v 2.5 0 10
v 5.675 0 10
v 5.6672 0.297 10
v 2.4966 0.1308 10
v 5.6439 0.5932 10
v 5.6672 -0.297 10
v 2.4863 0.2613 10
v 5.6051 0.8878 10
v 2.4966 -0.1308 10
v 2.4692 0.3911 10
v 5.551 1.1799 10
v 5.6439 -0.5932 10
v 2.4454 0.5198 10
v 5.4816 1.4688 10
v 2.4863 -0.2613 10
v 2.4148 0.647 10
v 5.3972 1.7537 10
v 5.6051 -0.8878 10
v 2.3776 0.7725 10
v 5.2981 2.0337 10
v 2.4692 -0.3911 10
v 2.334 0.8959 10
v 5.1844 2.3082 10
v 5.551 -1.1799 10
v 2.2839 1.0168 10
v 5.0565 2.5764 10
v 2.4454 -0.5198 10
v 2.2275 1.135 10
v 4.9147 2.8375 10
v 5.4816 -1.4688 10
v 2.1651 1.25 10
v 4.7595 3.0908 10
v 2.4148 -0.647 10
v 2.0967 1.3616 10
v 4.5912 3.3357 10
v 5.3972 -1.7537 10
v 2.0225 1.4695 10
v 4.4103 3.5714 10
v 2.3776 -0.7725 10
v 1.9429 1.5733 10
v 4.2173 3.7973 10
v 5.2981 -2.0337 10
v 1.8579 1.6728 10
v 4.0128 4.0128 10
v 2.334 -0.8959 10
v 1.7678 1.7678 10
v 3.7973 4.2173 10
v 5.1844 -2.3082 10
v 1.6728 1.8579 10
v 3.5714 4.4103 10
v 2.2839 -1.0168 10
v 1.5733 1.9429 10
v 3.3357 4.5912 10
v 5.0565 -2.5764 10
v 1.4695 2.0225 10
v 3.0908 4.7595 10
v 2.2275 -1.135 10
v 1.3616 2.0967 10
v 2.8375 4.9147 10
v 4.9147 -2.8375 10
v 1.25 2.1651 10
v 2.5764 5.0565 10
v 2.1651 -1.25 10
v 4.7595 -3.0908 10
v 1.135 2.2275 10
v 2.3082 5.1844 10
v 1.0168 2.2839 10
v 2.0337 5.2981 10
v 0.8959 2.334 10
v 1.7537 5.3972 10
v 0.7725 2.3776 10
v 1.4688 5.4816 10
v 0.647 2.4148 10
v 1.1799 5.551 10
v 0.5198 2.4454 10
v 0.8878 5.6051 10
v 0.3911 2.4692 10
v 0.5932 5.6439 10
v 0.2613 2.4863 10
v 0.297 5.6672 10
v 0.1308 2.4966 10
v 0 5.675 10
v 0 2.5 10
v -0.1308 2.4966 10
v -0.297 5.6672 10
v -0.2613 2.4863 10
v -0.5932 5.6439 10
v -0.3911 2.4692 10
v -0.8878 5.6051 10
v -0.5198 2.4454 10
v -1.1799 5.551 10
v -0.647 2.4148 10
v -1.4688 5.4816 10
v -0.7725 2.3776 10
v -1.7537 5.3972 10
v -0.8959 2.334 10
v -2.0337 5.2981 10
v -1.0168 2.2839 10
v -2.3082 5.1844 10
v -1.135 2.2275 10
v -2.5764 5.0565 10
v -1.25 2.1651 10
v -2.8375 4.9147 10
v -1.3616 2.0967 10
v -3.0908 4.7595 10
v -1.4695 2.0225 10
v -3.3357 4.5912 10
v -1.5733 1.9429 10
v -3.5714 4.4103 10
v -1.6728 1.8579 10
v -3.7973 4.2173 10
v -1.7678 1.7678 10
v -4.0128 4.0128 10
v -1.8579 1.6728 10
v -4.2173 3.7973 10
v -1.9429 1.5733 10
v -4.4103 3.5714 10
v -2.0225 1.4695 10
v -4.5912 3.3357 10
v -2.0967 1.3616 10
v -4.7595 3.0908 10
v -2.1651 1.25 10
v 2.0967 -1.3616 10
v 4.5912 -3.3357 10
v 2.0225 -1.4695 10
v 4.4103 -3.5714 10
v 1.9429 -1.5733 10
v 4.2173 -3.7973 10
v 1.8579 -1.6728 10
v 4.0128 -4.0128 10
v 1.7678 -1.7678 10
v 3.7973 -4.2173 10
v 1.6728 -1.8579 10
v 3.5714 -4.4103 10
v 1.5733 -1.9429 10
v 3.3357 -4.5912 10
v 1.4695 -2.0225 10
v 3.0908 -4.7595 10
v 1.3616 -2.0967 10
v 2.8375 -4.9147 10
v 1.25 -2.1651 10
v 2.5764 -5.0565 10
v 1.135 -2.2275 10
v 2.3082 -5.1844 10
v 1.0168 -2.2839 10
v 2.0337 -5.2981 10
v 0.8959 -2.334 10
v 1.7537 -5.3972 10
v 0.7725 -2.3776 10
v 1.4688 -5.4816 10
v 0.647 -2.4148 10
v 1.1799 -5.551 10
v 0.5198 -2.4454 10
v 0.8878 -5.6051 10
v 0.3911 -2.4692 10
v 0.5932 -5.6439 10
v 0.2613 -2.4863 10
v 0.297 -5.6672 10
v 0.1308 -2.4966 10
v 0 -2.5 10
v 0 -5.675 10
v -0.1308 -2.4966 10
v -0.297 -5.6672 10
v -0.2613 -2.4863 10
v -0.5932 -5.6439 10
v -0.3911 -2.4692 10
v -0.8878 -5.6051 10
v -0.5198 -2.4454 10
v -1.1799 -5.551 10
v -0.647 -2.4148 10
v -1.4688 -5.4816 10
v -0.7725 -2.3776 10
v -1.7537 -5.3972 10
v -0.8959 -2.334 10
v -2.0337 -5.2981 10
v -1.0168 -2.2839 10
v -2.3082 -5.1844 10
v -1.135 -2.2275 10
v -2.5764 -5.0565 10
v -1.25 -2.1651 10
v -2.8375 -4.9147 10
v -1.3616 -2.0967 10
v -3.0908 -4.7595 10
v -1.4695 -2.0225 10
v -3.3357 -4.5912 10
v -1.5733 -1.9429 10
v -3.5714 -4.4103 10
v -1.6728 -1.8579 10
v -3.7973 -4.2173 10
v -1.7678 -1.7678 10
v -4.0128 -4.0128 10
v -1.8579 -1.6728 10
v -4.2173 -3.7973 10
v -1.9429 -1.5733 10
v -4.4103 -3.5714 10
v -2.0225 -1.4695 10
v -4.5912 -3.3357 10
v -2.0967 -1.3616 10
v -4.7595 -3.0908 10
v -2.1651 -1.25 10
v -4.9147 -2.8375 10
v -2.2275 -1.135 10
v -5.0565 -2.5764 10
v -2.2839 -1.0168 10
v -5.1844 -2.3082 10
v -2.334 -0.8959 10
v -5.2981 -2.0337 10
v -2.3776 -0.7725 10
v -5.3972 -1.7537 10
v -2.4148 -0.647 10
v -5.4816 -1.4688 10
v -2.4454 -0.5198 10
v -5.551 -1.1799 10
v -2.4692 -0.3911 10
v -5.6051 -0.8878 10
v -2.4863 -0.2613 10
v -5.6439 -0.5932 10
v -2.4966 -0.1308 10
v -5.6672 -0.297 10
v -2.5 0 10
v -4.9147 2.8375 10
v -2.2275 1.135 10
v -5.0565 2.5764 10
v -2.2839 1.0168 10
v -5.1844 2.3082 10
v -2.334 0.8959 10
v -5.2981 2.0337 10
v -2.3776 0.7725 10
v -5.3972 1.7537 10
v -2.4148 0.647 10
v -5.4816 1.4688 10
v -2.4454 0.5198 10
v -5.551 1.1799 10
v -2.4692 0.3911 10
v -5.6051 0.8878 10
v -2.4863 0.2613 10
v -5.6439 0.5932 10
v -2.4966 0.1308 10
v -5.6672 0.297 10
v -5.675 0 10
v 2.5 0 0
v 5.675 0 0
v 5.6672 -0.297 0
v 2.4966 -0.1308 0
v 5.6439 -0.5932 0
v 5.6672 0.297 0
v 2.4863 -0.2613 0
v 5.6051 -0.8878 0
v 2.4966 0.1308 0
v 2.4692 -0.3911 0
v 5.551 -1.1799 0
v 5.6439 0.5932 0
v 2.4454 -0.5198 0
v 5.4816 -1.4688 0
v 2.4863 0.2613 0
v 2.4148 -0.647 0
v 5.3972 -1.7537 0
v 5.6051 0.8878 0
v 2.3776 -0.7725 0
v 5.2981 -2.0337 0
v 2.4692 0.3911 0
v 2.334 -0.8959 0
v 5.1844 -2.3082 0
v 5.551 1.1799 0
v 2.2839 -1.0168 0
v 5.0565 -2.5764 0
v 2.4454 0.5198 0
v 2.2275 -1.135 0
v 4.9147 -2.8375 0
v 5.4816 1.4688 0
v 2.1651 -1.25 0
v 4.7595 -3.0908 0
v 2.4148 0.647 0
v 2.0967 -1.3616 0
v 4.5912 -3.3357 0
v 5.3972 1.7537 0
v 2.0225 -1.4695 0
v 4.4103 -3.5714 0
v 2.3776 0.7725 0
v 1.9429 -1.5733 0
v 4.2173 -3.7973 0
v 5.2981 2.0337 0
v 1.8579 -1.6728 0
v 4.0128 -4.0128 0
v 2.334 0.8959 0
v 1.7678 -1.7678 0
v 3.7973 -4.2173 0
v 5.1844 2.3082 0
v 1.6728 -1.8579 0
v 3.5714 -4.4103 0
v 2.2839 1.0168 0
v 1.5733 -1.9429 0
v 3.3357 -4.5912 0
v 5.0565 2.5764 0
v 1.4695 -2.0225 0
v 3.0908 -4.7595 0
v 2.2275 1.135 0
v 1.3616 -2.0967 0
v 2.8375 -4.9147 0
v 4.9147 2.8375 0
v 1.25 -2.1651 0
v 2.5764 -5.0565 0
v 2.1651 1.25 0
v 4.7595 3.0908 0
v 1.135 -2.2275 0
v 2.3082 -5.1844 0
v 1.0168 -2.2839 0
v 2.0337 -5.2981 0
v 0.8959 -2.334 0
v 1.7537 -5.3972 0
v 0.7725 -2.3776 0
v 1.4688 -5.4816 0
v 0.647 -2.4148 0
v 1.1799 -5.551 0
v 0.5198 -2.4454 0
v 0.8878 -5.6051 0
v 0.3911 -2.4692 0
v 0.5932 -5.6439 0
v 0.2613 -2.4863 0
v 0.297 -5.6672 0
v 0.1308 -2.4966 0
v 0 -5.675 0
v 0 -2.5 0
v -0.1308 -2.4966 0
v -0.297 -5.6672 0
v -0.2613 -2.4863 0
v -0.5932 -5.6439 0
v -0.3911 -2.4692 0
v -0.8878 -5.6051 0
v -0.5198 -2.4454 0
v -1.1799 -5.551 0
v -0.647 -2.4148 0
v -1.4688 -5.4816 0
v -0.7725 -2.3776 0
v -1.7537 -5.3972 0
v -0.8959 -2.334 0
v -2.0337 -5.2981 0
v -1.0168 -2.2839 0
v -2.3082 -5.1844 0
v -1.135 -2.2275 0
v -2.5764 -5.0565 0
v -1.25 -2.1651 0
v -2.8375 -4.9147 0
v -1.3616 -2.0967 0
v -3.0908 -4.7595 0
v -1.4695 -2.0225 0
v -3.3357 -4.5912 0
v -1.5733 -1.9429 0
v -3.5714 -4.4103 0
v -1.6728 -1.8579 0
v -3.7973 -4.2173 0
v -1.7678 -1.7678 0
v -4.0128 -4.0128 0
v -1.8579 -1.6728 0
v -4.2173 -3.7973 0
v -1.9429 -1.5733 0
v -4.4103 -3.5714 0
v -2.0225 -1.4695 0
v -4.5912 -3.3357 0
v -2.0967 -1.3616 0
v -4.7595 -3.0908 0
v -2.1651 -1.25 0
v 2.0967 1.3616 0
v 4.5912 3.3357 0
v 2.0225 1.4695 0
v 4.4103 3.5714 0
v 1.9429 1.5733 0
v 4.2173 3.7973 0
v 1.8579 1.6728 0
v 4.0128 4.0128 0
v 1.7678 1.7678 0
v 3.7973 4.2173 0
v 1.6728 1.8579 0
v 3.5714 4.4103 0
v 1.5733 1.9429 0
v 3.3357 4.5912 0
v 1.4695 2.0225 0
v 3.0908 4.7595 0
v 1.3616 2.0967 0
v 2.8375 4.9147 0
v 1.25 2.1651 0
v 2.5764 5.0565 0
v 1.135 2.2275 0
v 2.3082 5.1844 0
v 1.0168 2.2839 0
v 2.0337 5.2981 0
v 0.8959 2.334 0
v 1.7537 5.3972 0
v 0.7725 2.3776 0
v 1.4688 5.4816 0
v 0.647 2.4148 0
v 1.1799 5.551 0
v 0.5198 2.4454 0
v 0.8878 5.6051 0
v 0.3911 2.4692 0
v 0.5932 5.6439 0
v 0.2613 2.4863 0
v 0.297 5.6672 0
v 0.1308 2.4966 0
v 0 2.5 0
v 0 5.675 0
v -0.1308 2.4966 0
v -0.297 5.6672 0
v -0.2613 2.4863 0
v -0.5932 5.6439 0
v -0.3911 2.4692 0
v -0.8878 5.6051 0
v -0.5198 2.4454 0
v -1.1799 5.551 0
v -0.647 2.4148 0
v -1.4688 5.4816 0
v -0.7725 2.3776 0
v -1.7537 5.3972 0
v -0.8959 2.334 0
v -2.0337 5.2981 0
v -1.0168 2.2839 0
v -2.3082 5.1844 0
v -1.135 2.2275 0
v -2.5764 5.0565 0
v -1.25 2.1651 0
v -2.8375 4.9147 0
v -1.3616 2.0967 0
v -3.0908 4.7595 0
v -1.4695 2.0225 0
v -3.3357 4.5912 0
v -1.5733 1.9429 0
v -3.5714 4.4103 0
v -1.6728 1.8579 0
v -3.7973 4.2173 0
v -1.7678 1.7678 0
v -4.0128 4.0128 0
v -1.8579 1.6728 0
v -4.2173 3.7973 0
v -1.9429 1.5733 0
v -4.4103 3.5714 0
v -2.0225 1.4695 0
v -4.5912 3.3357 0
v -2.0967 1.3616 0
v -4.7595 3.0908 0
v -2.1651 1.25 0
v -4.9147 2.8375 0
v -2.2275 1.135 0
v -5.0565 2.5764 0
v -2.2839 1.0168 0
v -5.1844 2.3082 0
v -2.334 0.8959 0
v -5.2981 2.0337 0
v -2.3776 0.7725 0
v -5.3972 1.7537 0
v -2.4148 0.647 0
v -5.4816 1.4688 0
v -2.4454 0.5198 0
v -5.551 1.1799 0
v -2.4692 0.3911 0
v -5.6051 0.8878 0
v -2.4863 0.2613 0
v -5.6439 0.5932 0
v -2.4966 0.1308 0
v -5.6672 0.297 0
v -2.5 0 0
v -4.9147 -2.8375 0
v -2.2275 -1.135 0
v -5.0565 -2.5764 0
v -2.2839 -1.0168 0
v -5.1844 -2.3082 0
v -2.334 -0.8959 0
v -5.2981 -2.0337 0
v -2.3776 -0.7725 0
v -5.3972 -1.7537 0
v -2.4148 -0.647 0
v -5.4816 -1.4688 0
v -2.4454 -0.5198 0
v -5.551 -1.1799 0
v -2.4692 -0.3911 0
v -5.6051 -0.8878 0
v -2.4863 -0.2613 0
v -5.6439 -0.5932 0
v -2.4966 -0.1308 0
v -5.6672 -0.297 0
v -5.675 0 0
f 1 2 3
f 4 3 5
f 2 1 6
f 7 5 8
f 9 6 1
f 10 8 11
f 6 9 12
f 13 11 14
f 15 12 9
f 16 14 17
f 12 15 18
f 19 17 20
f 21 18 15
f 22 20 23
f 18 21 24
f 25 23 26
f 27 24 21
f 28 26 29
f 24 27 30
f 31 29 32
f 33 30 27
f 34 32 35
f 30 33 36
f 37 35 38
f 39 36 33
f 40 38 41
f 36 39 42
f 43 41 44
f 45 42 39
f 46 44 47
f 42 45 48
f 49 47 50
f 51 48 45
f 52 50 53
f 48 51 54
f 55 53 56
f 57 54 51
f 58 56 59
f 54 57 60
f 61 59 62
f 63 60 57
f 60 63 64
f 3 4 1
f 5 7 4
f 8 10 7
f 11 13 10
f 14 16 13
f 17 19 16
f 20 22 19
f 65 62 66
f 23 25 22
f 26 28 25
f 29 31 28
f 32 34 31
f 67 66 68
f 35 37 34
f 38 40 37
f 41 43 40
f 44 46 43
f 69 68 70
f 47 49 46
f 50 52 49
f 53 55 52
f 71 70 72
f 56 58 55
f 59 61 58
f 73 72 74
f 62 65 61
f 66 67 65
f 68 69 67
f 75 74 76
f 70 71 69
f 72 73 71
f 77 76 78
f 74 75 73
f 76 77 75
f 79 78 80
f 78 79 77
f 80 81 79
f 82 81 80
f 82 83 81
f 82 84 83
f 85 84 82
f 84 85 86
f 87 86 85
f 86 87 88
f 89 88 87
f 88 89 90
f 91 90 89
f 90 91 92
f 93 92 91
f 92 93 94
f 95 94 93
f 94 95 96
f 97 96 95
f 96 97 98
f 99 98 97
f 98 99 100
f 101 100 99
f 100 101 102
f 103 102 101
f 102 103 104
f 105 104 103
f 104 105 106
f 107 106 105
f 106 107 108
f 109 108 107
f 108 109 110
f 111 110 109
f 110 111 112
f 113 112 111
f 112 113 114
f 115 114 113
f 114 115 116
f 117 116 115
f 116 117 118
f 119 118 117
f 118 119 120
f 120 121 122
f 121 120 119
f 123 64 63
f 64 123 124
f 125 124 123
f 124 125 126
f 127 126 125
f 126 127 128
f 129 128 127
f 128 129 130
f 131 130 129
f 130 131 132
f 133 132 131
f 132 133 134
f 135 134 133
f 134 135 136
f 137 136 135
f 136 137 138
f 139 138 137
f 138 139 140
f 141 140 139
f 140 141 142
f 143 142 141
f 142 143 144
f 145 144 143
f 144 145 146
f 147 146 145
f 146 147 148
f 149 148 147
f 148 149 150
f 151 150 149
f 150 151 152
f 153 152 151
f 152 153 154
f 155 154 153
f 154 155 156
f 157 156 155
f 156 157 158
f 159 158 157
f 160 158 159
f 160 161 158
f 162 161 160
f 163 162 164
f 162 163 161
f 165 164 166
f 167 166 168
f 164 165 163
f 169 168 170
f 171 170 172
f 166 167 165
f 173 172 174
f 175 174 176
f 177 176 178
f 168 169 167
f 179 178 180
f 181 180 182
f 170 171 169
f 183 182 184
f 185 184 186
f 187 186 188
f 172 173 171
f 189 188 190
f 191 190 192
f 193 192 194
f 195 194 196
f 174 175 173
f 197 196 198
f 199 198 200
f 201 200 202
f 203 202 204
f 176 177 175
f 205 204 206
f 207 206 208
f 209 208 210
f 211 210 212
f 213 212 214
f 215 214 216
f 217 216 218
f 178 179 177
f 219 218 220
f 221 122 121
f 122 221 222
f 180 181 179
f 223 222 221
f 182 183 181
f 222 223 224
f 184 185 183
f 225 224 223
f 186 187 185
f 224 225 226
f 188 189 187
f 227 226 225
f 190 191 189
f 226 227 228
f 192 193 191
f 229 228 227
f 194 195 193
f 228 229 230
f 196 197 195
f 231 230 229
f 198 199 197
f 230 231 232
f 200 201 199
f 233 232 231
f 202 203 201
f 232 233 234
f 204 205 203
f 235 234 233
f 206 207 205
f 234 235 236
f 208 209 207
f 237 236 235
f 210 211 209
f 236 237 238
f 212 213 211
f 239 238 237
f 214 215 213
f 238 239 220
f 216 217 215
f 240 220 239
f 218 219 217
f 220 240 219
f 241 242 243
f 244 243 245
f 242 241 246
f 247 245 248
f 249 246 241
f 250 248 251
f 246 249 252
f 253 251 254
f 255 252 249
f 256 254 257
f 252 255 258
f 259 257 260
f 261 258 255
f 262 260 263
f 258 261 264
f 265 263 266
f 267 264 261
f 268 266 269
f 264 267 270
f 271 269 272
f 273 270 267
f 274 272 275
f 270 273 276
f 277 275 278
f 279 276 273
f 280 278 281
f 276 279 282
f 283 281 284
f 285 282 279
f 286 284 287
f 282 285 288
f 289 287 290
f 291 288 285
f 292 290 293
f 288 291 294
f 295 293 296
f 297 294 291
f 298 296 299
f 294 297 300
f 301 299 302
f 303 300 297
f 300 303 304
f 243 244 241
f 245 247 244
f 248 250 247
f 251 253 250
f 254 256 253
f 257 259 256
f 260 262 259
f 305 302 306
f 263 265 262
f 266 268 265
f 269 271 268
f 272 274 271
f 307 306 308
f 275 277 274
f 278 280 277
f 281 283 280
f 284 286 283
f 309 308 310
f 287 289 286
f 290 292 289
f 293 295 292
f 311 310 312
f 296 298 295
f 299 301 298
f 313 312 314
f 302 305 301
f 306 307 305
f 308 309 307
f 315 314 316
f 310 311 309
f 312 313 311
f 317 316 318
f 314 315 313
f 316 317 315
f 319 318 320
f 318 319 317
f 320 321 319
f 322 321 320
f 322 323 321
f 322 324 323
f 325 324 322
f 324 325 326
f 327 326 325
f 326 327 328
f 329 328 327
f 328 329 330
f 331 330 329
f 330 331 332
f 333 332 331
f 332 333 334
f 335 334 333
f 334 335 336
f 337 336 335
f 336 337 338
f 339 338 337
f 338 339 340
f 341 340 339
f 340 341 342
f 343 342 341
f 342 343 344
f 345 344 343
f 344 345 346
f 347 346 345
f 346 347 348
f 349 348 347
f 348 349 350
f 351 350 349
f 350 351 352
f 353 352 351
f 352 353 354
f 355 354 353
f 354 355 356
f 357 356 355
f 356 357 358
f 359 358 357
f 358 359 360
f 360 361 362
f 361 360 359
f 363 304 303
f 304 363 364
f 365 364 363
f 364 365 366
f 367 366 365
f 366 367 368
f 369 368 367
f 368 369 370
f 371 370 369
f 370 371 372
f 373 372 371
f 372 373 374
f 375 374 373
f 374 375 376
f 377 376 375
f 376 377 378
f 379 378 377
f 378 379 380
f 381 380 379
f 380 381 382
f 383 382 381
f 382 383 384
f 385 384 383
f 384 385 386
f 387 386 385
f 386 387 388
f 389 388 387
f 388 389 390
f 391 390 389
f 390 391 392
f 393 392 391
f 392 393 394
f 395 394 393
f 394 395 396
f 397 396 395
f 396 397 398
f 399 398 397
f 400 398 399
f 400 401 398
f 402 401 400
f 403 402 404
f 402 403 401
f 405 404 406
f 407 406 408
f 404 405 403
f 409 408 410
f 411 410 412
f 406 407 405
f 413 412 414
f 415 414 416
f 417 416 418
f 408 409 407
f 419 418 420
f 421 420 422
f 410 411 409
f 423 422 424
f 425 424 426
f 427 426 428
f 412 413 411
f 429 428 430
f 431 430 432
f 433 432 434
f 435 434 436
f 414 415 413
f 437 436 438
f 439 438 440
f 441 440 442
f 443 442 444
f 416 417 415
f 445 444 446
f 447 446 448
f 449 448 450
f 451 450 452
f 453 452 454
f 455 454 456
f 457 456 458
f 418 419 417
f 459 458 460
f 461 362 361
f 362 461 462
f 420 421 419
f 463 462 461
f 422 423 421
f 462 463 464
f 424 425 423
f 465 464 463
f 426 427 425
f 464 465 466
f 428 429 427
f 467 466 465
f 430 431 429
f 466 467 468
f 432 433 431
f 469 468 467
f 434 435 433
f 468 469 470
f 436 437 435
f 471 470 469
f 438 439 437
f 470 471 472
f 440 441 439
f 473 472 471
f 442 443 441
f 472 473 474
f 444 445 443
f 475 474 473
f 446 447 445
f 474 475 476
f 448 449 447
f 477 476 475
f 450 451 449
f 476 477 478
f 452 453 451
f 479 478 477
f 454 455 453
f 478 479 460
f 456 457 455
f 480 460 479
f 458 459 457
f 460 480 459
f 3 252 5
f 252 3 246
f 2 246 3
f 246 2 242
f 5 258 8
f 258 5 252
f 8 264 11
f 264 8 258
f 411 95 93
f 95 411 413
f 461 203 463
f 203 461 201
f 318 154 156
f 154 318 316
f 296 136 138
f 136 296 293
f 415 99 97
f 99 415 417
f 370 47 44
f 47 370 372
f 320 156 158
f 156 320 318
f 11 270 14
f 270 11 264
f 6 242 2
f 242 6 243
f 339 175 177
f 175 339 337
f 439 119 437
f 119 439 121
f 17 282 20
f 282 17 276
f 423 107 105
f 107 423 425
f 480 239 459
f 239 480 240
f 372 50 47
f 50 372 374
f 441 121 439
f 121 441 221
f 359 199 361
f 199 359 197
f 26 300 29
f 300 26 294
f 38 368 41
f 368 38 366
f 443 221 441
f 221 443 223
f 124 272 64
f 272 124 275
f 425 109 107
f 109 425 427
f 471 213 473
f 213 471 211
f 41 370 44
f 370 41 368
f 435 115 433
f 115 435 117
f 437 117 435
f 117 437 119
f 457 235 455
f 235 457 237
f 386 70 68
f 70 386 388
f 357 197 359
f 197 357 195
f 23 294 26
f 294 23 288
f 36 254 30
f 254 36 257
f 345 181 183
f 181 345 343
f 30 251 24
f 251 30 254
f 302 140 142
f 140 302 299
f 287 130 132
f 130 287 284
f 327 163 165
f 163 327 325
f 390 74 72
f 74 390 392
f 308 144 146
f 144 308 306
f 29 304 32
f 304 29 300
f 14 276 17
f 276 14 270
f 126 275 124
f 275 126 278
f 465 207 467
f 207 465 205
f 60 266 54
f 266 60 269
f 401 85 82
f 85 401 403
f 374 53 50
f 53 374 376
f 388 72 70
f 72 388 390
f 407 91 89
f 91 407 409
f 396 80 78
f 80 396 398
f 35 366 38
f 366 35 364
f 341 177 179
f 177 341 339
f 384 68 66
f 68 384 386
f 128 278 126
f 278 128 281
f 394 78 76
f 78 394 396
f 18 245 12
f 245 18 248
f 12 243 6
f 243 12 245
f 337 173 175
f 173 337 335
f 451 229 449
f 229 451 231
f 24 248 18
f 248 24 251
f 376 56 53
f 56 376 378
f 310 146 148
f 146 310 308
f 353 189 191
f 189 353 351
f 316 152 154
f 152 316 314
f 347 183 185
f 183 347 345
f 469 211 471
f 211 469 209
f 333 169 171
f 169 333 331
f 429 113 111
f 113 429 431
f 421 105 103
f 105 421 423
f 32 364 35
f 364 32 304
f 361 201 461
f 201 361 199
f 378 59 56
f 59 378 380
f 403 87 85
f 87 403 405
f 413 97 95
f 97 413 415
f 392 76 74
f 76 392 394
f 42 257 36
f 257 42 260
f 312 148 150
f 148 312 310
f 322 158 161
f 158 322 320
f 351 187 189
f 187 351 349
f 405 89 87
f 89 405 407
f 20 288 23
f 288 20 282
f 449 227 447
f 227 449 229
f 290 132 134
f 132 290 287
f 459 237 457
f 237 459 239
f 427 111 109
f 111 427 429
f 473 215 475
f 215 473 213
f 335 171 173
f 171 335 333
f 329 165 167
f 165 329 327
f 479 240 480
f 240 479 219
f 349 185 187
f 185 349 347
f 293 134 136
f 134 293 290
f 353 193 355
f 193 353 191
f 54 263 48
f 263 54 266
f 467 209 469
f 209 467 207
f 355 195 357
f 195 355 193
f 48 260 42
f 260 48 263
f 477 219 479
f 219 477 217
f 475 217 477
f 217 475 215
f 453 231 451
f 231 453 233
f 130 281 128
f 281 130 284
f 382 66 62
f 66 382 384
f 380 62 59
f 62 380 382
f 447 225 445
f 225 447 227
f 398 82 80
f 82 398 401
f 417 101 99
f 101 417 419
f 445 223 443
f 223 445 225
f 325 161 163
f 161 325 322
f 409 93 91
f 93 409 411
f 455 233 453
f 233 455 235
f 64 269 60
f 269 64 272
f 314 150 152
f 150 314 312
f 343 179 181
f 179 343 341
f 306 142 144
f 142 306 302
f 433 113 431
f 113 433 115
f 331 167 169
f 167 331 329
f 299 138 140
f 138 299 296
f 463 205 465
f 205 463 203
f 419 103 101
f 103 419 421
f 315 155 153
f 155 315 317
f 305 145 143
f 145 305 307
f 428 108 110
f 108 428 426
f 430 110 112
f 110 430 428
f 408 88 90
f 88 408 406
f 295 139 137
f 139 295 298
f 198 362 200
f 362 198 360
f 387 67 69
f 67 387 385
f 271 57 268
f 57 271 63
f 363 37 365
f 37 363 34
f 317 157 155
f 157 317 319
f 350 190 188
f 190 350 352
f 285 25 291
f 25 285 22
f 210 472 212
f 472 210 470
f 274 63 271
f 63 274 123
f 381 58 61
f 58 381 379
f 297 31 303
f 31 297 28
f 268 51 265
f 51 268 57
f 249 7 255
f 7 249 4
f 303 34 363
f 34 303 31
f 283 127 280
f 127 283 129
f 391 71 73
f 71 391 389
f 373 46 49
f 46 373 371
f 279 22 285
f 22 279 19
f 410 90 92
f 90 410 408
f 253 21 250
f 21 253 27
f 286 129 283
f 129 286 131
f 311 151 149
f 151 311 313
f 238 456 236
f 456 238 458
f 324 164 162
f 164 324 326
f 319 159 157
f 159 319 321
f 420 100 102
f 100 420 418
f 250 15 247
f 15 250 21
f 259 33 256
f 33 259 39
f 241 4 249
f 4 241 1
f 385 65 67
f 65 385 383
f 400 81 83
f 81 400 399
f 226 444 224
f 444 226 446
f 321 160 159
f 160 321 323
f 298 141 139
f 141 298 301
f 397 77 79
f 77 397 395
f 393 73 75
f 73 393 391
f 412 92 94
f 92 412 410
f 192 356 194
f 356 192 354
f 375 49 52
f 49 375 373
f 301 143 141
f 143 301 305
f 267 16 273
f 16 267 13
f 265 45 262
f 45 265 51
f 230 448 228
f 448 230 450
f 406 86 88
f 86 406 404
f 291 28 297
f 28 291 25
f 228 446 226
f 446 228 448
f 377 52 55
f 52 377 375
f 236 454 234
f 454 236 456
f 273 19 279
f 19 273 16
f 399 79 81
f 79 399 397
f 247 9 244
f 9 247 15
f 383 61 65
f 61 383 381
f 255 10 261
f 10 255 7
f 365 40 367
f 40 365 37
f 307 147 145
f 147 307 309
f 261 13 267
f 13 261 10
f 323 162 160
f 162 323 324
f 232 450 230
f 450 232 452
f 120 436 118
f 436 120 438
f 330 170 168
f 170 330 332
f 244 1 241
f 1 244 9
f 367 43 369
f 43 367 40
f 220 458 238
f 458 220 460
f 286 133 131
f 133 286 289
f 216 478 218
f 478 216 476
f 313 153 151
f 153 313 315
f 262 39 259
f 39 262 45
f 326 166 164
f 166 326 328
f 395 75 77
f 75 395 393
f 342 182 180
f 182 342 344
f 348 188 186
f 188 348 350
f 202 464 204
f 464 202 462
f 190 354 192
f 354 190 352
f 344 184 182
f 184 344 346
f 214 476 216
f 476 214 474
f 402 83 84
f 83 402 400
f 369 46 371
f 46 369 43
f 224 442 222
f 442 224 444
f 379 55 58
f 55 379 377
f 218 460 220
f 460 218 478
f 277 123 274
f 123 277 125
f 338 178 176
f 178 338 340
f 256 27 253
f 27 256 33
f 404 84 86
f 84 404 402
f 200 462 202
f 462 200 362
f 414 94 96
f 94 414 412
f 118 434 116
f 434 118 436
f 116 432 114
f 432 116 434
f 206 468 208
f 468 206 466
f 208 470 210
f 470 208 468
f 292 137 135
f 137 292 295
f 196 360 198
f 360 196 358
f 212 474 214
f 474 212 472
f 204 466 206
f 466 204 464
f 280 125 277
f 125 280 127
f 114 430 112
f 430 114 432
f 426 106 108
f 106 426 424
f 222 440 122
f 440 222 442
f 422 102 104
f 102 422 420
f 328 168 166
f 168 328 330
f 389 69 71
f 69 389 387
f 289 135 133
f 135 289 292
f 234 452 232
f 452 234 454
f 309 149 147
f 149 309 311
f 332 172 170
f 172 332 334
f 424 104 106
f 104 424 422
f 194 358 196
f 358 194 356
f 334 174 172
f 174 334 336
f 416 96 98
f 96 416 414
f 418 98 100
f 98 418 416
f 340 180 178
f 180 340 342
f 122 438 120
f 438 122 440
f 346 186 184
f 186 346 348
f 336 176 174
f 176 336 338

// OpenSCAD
$fn = 120;

// Timing pulley parameters
teeth = 16;
pitch_diameter = 9.75;     // mm
pitch = PI * pitch_diameter / teeth;  // derived circular pitch
pulley_width = 10;         // mm
bore_diameter = 5;         // mm

// Tooth geometry (simple trapezoidal approximation)
tooth_height = 1.2;        // mm (radial)
tooth_top_width = pitch * 0.35;
tooth_base_width = pitch * 0.75;

// Body geometry
pitch_radius = pitch_diameter / 2;
root_radius = pitch_radius - tooth_height;
hub_extra = 2.0;           // mm extra radius beyond root for strength
hub_radius = root_radius + hub_extra;

module tooth2d() {
    // Trapezoid centered on X axis, extending outward in +Y
    polygon(points=[
        [-tooth_base_width/2, 0],
        [ tooth_base_width/2, 0],
        [ tooth_top_width/2,  tooth_height],
        [-tooth_top_width/2,  tooth_height]
    ]);
}

module pulley() {
    difference() {
        union() {
            // Main cylinder up to root radius
            cylinder(h=pulley_width, r=root_radius);

            // Add teeth around pitch circle (placed at root radius)
            for (i = [0:teeth-1]) {
                rotate([0,0, i*360/teeth])
                    translate([0, root_radius, 0])
                        linear_extrude(height=pulley_width)
                            tooth2d();
            }

            // Slight hub reinforcement (optional)
            cylinder(h=pulley_width, r=hub_radius);
        }

        // Bore
        translate([0,0,-0.5])
            cylinder(h=pulley_width+1, r=bore_diameter/2);
    }
}

pulley();
